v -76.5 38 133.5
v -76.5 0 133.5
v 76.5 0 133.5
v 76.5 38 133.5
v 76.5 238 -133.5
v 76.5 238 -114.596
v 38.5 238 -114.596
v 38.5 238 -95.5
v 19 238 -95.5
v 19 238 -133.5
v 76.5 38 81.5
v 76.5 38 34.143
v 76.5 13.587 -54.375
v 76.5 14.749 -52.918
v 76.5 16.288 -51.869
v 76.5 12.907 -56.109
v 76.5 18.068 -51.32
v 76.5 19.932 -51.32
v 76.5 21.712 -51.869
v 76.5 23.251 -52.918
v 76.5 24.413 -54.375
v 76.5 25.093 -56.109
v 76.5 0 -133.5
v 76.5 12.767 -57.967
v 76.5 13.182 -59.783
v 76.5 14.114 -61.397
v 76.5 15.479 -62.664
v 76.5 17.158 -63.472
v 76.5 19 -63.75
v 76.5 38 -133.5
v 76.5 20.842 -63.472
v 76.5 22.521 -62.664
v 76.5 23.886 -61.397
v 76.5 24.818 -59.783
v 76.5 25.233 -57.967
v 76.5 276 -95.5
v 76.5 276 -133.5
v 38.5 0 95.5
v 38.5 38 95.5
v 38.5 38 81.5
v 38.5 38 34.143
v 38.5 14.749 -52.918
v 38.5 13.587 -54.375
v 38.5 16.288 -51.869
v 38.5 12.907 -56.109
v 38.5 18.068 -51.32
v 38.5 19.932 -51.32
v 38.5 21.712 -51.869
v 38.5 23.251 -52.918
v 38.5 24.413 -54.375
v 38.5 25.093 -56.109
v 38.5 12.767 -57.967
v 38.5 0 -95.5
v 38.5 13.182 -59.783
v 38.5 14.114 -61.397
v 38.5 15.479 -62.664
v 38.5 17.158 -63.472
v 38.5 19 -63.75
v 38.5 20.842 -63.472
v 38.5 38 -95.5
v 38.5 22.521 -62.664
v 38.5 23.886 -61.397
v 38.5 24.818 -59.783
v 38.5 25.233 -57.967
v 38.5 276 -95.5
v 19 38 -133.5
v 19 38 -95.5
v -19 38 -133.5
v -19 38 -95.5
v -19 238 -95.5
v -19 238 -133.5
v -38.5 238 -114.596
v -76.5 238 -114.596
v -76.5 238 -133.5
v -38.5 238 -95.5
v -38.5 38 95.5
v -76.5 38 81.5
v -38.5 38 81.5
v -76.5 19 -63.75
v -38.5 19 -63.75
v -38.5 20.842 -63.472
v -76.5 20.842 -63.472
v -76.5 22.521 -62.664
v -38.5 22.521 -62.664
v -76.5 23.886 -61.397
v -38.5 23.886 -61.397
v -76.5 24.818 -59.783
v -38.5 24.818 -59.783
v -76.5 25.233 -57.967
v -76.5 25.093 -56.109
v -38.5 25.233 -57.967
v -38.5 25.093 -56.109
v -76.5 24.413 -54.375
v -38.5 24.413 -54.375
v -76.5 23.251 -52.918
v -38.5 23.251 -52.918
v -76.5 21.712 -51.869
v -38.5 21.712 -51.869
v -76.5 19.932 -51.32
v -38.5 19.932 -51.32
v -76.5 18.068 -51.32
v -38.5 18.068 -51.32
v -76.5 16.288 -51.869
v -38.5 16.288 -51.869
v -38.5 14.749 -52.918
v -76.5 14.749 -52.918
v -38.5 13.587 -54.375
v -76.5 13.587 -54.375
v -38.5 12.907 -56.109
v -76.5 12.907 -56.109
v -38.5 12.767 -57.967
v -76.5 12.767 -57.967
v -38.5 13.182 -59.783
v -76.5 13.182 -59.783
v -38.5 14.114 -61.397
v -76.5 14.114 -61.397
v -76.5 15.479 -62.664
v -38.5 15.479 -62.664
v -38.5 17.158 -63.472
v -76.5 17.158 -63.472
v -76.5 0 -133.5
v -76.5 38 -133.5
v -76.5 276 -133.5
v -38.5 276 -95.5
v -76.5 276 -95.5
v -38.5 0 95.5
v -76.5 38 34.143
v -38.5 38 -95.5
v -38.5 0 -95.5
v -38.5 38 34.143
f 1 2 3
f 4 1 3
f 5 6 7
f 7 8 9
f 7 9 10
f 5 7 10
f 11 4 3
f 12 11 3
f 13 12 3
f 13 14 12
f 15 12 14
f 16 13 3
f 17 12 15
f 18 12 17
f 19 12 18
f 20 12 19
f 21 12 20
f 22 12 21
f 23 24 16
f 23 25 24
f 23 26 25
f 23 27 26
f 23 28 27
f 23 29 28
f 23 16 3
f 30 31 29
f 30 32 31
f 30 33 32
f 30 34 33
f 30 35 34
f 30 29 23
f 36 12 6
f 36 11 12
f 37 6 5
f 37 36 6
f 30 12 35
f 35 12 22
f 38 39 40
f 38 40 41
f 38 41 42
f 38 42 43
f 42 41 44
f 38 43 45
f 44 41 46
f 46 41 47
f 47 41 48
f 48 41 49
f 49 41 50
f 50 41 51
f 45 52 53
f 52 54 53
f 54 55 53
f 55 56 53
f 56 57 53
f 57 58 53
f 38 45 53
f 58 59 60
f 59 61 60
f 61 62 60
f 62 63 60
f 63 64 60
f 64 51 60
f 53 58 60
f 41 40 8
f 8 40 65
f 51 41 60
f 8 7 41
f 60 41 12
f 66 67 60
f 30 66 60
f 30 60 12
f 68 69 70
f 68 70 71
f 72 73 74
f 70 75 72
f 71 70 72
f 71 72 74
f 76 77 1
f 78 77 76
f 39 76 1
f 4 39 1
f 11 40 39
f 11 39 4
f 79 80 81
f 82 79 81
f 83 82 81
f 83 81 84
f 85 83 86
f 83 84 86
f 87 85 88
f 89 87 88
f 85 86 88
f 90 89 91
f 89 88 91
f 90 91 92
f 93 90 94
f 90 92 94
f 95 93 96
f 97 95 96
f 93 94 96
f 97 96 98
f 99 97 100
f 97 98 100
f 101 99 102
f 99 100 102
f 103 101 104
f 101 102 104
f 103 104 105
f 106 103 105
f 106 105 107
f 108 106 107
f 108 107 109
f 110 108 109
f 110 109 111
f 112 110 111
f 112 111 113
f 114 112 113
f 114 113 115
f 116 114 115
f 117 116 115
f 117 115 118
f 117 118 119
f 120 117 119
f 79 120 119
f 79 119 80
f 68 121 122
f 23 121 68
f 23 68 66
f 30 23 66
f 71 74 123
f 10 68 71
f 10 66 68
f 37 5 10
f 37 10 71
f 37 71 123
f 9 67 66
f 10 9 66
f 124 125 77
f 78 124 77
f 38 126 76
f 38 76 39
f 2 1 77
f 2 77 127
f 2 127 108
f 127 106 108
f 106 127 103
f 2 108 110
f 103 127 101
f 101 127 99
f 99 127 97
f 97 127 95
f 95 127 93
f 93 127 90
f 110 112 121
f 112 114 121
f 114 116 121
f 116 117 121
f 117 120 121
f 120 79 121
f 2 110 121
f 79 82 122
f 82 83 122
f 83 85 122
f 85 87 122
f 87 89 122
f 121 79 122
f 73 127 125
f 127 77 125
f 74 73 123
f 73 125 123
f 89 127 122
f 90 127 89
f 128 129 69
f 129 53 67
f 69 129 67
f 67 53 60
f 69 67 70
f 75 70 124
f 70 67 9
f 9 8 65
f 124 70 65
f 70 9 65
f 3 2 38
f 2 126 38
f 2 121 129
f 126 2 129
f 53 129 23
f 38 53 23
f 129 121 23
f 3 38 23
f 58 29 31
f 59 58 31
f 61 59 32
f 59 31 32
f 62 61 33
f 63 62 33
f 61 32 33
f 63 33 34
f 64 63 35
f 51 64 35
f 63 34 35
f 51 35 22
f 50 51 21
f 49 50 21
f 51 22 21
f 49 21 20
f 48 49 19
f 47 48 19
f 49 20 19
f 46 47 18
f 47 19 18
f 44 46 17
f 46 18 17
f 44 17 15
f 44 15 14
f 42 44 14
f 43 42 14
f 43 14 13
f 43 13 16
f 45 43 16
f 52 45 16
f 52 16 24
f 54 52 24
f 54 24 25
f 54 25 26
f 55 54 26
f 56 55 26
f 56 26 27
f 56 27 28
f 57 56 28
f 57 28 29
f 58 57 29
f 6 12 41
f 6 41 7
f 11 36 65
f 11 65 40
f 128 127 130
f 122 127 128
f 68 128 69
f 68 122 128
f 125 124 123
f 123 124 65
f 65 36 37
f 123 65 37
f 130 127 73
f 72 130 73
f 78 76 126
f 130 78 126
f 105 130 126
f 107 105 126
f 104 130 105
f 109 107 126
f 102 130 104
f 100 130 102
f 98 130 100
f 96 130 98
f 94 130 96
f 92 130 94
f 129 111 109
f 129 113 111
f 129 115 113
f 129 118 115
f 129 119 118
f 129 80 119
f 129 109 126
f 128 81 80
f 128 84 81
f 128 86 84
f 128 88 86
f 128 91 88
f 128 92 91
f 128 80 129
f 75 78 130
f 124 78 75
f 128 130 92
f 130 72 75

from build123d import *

# Parameters (mm, degrees)
SKETCH1_W                = 153
SKETCH1_H                = 267
SKETCH1_W_2              = 77
SKETCH1_H_2              = 191
BOSS_EXTRUDE1_DEPTH      = 38
SKETCH2_W                = 38
SKETCH2_H                = 38
BOSS_EXTRUDE2_DEPTH      = 200
SKETCH3_W                = 38
SKETCH3_H                = 38
BOSS_EXTRUDE3_DEPTH      = 76.5
BOSS_EXTRUDE3_DEPTH_BACK = 76.5
BOSS_EXTRUDE4_DEPTH      = 38
SKETCH7_R                = 6.25
CUT_EXTRUDE1_DEPTH       = 154


with BuildPart() as part:
    # Sketch1 → Boss-Extrude1 (new body)
    with BuildSketch(Plane(origin=(0, 0, 0), x_dir=(1, 0, 0), z_dir=(0, 1, 0))):
        Rectangle(SKETCH1_W, SKETCH1_H)
        Rectangle(SKETCH1_W_2, SKETCH1_H_2, mode=Mode.SUBTRACT)
    extrude(amount=BOSS_EXTRUDE1_DEPTH)

    # Sketch2 → Boss-Extrude2 (add)
    with BuildSketch(Plane(origin=(0, 38, 0), x_dir=(1, 0, 0), z_dir=(0, 1, 0))):
        with Locations((0, 114.5)):
            Rectangle(SKETCH2_W, SKETCH2_H)
    extrude(amount=BOSS_EXTRUDE2_DEPTH)

    # Sketch3 → Boss-Extrude3 (add, two sides)
    with BuildSketch(Plane(origin=(0, 0, 0), x_dir=(0, 0, -1), z_dir=(1, 0, 0))) as boss_extrude3_sk:
        with Locations((114.5, 257)):
            Rectangle(SKETCH3_W, SKETCH3_H)
    extrude(amount=BOSS_EXTRUDE3_DEPTH)
    extrude(boss_extrude3_sk.sketch, amount=-BOSS_EXTRUDE3_DEPTH_BACK)

    # Sketch6 → Boss-Extrude4 (add)
    with BuildSketch(Plane(origin=(76.5, 0, 0), x_dir=(0, 0, -1), z_dir=(1, 0, 0))):
        Polygon((95.5, 276), (-81.5, 38), (-34.143309895, 38), (114.596185904, 238), (95.5, 238), align=None)
    boss_extrude4 = extrude(amount=-BOSS_EXTRUDE4_DEPTH)

    # Mirror1: Boss-Extrude4 across plane
    add(boss_extrude4.mirror(Plane(origin=(0, 0, 0), x_dir=(0, 0, 1), z_dir=(1, 0, 0))))

    # Sketch7 → Cut-Extrude1 (cut, through all)
    with BuildSketch(Plane(origin=(76.5, 0, 0), x_dir=(0, 0, -1), z_dir=(1, 0, 0))):
        with Locations((57.5, 19)):
            Circle(SKETCH7_R)
    extrude(amount=-CUT_EXTRUDE1_DEPTH, mode=Mode.SUBTRACT)


solid = part.part
